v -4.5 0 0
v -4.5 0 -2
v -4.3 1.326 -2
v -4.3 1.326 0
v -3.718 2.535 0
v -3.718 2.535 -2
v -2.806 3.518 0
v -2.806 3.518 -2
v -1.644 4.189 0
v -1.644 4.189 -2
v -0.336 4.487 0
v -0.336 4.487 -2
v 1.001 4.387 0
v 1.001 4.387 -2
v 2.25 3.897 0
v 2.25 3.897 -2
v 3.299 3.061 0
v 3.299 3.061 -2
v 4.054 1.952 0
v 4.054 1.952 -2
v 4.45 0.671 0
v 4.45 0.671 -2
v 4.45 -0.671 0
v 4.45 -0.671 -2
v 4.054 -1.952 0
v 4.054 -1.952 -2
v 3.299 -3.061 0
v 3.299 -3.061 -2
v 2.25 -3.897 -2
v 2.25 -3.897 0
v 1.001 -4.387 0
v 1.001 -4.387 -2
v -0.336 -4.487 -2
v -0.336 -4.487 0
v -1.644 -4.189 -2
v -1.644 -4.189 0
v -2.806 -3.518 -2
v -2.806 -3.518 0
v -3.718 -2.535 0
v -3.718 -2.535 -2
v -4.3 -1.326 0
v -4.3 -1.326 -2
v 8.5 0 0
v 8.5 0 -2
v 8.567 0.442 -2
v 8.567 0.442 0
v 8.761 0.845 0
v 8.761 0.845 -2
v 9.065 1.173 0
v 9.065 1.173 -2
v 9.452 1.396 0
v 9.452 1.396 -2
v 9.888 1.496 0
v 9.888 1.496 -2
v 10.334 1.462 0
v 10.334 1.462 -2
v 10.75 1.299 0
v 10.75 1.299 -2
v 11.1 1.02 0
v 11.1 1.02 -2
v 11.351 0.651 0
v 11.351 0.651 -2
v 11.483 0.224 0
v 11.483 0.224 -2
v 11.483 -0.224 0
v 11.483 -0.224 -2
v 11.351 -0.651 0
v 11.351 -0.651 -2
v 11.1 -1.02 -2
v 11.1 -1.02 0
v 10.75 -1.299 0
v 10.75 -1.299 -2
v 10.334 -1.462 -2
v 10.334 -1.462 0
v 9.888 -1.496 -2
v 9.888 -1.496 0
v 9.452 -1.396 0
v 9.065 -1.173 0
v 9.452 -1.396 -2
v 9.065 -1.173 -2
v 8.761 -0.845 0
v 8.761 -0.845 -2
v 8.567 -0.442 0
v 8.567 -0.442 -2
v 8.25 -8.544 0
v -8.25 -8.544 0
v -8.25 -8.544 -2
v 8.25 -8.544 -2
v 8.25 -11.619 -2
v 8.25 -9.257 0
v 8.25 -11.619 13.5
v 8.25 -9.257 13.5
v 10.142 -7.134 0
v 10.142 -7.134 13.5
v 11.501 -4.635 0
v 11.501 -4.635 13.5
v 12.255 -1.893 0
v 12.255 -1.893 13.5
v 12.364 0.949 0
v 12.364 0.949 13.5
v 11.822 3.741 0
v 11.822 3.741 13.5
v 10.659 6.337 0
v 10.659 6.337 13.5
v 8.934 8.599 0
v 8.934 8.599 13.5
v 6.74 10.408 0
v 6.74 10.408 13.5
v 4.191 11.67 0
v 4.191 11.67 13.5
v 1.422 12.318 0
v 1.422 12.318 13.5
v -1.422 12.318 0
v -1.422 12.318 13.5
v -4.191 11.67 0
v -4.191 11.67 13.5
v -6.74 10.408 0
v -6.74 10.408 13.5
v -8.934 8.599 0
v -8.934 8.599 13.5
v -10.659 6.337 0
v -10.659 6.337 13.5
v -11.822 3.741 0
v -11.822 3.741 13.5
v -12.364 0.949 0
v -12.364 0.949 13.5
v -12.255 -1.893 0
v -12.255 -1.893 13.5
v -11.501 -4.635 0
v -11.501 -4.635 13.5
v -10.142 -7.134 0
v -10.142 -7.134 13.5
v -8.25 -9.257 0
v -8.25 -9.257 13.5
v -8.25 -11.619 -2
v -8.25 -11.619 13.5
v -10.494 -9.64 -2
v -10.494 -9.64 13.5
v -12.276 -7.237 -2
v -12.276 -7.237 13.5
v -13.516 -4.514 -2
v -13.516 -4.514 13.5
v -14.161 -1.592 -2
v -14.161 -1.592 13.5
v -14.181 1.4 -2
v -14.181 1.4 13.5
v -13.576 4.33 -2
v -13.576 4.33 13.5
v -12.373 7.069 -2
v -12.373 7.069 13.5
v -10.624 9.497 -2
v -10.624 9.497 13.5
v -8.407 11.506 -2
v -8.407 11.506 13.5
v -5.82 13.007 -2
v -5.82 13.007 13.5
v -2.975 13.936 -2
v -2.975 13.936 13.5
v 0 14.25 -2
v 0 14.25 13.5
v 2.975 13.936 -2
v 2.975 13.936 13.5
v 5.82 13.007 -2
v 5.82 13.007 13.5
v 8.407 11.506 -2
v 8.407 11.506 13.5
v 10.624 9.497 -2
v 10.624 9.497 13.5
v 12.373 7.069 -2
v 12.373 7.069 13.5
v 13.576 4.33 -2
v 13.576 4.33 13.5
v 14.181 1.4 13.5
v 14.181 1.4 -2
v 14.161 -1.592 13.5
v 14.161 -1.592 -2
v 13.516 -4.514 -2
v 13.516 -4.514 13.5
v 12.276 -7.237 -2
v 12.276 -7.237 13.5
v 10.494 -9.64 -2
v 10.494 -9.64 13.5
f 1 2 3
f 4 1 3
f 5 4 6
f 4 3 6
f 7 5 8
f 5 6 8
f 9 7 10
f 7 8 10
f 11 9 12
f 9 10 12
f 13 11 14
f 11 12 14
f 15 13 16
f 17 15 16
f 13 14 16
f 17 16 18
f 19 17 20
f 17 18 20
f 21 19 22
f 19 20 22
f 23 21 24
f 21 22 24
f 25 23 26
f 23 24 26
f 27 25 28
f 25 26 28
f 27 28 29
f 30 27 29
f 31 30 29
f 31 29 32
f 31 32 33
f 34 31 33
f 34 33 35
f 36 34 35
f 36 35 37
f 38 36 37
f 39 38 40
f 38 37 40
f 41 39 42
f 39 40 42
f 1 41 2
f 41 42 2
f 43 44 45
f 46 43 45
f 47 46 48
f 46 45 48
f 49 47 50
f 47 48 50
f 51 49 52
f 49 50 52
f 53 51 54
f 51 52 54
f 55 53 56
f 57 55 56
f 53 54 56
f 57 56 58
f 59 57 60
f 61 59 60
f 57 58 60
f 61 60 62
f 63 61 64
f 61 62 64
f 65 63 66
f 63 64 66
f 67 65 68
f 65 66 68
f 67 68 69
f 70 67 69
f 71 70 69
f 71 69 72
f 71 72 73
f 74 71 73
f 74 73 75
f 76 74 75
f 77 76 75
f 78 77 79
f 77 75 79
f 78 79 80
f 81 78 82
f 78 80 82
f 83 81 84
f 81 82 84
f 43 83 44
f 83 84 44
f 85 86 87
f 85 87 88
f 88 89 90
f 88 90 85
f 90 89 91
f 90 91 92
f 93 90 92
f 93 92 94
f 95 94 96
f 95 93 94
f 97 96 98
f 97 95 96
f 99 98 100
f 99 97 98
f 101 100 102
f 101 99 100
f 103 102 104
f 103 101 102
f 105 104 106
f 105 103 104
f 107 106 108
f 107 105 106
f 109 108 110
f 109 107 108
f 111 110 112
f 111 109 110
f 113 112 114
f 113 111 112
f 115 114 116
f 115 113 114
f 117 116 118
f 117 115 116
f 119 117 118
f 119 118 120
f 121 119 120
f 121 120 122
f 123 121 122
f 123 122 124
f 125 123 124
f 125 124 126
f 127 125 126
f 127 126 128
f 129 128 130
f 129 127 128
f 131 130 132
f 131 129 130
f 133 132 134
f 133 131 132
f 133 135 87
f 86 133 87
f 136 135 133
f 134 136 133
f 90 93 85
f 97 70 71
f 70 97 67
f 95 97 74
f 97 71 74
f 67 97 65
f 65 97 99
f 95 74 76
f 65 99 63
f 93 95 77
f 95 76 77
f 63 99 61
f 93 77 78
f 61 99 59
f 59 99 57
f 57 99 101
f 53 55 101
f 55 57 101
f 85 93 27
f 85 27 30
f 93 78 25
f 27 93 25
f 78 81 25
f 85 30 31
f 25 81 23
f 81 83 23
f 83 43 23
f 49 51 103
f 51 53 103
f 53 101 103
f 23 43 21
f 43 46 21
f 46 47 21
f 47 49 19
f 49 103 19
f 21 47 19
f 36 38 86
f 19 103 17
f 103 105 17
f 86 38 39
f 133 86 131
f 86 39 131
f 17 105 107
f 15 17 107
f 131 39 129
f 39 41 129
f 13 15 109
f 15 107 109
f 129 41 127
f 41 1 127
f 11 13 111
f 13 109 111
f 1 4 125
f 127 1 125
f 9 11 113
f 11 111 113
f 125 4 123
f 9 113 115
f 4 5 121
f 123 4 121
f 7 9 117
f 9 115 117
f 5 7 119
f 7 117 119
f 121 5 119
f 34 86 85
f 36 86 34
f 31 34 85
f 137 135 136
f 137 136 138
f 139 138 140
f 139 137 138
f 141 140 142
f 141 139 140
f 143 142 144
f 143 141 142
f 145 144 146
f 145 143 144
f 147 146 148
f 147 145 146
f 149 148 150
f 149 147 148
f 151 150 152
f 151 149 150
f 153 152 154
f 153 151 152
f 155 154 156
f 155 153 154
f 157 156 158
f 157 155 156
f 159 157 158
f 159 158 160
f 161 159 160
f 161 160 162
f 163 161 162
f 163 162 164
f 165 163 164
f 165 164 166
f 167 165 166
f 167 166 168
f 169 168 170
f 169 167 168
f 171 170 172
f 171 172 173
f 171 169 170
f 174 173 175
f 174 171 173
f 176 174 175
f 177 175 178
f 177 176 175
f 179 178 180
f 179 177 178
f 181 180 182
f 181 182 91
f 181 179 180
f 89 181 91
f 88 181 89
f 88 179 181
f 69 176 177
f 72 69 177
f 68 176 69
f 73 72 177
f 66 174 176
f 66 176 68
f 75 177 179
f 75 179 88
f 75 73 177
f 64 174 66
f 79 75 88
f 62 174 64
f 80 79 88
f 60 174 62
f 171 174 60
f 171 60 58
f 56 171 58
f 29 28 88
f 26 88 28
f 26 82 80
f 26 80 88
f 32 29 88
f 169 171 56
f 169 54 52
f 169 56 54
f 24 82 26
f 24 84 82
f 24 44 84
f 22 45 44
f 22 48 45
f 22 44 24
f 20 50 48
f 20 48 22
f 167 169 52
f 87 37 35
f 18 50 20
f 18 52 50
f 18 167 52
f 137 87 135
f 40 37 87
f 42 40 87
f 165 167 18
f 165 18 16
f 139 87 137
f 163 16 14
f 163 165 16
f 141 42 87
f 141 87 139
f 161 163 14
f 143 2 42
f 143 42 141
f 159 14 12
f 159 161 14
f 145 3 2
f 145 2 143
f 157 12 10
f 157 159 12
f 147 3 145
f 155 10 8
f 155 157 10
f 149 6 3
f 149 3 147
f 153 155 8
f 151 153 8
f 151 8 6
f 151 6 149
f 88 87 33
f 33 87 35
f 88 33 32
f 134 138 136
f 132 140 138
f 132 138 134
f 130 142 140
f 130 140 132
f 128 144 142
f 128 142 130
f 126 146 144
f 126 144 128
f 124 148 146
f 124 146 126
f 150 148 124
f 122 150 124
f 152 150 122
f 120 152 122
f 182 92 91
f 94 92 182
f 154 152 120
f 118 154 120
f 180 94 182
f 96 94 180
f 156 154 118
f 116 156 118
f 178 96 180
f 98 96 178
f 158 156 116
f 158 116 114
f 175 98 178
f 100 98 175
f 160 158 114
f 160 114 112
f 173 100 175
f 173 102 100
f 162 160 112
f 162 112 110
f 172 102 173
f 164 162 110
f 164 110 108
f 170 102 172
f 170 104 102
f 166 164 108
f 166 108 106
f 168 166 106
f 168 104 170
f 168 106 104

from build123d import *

# Parameters (mm, degrees)
SKETCH_1_R          = 14.25
SKETCH_1_R_2        = 12.4
EXTRUDE_1_DEPTH     = 13.5
EXTRUDE_START       = 2
SKETCH_2_R          = 14.25
SKETCH_2_R_2        = 4.5
SKETCH_2_R_3        = 1.5
EXTRUDE_2_DEPTH     = 2
SKETCH_4_W          = 16.5
SKETCH_4_H          = 7.711801842
CUT_EXTRUDE_2_DEPTH = 19


with BuildPart() as part:
    # 草图1 → 凸台-拉伸1 (new body)
    with BuildSketch(Plane.XY):
        Circle(SKETCH_1_R)
        Circle(SKETCH_1_R_2, mode=Mode.SUBTRACT)
    extrude(amount=EXTRUDE_1_DEPTH)

    # 草图2 → 凸台-拉伸2 (add)
    with BuildSketch(Plane(origin=(0, 0, 0), x_dir=(-1, 0, 0), z_dir=(0, 0, -1)).offset(EXTRUDE_START)):
        Circle(SKETCH_2_R)
        Circle(SKETCH_2_R_2, mode=Mode.SUBTRACT)
        with Locations((-10, 0)):
            Circle(SKETCH_2_R_3, mode=Mode.SUBTRACT)
    extrude(amount=-EXTRUDE_2_DEPTH)

    # 草图4 → 切除-拉伸2 (cut)
    with BuildSketch(Plane.XY.offset(13.5)):
        with Locations((0, -12.4)):
            Rectangle(SKETCH_4_W, SKETCH_4_H)
    extrude(amount=-CUT_EXTRUDE_2_DEPTH, mode=Mode.SUBTRACT)


solid = part.part
